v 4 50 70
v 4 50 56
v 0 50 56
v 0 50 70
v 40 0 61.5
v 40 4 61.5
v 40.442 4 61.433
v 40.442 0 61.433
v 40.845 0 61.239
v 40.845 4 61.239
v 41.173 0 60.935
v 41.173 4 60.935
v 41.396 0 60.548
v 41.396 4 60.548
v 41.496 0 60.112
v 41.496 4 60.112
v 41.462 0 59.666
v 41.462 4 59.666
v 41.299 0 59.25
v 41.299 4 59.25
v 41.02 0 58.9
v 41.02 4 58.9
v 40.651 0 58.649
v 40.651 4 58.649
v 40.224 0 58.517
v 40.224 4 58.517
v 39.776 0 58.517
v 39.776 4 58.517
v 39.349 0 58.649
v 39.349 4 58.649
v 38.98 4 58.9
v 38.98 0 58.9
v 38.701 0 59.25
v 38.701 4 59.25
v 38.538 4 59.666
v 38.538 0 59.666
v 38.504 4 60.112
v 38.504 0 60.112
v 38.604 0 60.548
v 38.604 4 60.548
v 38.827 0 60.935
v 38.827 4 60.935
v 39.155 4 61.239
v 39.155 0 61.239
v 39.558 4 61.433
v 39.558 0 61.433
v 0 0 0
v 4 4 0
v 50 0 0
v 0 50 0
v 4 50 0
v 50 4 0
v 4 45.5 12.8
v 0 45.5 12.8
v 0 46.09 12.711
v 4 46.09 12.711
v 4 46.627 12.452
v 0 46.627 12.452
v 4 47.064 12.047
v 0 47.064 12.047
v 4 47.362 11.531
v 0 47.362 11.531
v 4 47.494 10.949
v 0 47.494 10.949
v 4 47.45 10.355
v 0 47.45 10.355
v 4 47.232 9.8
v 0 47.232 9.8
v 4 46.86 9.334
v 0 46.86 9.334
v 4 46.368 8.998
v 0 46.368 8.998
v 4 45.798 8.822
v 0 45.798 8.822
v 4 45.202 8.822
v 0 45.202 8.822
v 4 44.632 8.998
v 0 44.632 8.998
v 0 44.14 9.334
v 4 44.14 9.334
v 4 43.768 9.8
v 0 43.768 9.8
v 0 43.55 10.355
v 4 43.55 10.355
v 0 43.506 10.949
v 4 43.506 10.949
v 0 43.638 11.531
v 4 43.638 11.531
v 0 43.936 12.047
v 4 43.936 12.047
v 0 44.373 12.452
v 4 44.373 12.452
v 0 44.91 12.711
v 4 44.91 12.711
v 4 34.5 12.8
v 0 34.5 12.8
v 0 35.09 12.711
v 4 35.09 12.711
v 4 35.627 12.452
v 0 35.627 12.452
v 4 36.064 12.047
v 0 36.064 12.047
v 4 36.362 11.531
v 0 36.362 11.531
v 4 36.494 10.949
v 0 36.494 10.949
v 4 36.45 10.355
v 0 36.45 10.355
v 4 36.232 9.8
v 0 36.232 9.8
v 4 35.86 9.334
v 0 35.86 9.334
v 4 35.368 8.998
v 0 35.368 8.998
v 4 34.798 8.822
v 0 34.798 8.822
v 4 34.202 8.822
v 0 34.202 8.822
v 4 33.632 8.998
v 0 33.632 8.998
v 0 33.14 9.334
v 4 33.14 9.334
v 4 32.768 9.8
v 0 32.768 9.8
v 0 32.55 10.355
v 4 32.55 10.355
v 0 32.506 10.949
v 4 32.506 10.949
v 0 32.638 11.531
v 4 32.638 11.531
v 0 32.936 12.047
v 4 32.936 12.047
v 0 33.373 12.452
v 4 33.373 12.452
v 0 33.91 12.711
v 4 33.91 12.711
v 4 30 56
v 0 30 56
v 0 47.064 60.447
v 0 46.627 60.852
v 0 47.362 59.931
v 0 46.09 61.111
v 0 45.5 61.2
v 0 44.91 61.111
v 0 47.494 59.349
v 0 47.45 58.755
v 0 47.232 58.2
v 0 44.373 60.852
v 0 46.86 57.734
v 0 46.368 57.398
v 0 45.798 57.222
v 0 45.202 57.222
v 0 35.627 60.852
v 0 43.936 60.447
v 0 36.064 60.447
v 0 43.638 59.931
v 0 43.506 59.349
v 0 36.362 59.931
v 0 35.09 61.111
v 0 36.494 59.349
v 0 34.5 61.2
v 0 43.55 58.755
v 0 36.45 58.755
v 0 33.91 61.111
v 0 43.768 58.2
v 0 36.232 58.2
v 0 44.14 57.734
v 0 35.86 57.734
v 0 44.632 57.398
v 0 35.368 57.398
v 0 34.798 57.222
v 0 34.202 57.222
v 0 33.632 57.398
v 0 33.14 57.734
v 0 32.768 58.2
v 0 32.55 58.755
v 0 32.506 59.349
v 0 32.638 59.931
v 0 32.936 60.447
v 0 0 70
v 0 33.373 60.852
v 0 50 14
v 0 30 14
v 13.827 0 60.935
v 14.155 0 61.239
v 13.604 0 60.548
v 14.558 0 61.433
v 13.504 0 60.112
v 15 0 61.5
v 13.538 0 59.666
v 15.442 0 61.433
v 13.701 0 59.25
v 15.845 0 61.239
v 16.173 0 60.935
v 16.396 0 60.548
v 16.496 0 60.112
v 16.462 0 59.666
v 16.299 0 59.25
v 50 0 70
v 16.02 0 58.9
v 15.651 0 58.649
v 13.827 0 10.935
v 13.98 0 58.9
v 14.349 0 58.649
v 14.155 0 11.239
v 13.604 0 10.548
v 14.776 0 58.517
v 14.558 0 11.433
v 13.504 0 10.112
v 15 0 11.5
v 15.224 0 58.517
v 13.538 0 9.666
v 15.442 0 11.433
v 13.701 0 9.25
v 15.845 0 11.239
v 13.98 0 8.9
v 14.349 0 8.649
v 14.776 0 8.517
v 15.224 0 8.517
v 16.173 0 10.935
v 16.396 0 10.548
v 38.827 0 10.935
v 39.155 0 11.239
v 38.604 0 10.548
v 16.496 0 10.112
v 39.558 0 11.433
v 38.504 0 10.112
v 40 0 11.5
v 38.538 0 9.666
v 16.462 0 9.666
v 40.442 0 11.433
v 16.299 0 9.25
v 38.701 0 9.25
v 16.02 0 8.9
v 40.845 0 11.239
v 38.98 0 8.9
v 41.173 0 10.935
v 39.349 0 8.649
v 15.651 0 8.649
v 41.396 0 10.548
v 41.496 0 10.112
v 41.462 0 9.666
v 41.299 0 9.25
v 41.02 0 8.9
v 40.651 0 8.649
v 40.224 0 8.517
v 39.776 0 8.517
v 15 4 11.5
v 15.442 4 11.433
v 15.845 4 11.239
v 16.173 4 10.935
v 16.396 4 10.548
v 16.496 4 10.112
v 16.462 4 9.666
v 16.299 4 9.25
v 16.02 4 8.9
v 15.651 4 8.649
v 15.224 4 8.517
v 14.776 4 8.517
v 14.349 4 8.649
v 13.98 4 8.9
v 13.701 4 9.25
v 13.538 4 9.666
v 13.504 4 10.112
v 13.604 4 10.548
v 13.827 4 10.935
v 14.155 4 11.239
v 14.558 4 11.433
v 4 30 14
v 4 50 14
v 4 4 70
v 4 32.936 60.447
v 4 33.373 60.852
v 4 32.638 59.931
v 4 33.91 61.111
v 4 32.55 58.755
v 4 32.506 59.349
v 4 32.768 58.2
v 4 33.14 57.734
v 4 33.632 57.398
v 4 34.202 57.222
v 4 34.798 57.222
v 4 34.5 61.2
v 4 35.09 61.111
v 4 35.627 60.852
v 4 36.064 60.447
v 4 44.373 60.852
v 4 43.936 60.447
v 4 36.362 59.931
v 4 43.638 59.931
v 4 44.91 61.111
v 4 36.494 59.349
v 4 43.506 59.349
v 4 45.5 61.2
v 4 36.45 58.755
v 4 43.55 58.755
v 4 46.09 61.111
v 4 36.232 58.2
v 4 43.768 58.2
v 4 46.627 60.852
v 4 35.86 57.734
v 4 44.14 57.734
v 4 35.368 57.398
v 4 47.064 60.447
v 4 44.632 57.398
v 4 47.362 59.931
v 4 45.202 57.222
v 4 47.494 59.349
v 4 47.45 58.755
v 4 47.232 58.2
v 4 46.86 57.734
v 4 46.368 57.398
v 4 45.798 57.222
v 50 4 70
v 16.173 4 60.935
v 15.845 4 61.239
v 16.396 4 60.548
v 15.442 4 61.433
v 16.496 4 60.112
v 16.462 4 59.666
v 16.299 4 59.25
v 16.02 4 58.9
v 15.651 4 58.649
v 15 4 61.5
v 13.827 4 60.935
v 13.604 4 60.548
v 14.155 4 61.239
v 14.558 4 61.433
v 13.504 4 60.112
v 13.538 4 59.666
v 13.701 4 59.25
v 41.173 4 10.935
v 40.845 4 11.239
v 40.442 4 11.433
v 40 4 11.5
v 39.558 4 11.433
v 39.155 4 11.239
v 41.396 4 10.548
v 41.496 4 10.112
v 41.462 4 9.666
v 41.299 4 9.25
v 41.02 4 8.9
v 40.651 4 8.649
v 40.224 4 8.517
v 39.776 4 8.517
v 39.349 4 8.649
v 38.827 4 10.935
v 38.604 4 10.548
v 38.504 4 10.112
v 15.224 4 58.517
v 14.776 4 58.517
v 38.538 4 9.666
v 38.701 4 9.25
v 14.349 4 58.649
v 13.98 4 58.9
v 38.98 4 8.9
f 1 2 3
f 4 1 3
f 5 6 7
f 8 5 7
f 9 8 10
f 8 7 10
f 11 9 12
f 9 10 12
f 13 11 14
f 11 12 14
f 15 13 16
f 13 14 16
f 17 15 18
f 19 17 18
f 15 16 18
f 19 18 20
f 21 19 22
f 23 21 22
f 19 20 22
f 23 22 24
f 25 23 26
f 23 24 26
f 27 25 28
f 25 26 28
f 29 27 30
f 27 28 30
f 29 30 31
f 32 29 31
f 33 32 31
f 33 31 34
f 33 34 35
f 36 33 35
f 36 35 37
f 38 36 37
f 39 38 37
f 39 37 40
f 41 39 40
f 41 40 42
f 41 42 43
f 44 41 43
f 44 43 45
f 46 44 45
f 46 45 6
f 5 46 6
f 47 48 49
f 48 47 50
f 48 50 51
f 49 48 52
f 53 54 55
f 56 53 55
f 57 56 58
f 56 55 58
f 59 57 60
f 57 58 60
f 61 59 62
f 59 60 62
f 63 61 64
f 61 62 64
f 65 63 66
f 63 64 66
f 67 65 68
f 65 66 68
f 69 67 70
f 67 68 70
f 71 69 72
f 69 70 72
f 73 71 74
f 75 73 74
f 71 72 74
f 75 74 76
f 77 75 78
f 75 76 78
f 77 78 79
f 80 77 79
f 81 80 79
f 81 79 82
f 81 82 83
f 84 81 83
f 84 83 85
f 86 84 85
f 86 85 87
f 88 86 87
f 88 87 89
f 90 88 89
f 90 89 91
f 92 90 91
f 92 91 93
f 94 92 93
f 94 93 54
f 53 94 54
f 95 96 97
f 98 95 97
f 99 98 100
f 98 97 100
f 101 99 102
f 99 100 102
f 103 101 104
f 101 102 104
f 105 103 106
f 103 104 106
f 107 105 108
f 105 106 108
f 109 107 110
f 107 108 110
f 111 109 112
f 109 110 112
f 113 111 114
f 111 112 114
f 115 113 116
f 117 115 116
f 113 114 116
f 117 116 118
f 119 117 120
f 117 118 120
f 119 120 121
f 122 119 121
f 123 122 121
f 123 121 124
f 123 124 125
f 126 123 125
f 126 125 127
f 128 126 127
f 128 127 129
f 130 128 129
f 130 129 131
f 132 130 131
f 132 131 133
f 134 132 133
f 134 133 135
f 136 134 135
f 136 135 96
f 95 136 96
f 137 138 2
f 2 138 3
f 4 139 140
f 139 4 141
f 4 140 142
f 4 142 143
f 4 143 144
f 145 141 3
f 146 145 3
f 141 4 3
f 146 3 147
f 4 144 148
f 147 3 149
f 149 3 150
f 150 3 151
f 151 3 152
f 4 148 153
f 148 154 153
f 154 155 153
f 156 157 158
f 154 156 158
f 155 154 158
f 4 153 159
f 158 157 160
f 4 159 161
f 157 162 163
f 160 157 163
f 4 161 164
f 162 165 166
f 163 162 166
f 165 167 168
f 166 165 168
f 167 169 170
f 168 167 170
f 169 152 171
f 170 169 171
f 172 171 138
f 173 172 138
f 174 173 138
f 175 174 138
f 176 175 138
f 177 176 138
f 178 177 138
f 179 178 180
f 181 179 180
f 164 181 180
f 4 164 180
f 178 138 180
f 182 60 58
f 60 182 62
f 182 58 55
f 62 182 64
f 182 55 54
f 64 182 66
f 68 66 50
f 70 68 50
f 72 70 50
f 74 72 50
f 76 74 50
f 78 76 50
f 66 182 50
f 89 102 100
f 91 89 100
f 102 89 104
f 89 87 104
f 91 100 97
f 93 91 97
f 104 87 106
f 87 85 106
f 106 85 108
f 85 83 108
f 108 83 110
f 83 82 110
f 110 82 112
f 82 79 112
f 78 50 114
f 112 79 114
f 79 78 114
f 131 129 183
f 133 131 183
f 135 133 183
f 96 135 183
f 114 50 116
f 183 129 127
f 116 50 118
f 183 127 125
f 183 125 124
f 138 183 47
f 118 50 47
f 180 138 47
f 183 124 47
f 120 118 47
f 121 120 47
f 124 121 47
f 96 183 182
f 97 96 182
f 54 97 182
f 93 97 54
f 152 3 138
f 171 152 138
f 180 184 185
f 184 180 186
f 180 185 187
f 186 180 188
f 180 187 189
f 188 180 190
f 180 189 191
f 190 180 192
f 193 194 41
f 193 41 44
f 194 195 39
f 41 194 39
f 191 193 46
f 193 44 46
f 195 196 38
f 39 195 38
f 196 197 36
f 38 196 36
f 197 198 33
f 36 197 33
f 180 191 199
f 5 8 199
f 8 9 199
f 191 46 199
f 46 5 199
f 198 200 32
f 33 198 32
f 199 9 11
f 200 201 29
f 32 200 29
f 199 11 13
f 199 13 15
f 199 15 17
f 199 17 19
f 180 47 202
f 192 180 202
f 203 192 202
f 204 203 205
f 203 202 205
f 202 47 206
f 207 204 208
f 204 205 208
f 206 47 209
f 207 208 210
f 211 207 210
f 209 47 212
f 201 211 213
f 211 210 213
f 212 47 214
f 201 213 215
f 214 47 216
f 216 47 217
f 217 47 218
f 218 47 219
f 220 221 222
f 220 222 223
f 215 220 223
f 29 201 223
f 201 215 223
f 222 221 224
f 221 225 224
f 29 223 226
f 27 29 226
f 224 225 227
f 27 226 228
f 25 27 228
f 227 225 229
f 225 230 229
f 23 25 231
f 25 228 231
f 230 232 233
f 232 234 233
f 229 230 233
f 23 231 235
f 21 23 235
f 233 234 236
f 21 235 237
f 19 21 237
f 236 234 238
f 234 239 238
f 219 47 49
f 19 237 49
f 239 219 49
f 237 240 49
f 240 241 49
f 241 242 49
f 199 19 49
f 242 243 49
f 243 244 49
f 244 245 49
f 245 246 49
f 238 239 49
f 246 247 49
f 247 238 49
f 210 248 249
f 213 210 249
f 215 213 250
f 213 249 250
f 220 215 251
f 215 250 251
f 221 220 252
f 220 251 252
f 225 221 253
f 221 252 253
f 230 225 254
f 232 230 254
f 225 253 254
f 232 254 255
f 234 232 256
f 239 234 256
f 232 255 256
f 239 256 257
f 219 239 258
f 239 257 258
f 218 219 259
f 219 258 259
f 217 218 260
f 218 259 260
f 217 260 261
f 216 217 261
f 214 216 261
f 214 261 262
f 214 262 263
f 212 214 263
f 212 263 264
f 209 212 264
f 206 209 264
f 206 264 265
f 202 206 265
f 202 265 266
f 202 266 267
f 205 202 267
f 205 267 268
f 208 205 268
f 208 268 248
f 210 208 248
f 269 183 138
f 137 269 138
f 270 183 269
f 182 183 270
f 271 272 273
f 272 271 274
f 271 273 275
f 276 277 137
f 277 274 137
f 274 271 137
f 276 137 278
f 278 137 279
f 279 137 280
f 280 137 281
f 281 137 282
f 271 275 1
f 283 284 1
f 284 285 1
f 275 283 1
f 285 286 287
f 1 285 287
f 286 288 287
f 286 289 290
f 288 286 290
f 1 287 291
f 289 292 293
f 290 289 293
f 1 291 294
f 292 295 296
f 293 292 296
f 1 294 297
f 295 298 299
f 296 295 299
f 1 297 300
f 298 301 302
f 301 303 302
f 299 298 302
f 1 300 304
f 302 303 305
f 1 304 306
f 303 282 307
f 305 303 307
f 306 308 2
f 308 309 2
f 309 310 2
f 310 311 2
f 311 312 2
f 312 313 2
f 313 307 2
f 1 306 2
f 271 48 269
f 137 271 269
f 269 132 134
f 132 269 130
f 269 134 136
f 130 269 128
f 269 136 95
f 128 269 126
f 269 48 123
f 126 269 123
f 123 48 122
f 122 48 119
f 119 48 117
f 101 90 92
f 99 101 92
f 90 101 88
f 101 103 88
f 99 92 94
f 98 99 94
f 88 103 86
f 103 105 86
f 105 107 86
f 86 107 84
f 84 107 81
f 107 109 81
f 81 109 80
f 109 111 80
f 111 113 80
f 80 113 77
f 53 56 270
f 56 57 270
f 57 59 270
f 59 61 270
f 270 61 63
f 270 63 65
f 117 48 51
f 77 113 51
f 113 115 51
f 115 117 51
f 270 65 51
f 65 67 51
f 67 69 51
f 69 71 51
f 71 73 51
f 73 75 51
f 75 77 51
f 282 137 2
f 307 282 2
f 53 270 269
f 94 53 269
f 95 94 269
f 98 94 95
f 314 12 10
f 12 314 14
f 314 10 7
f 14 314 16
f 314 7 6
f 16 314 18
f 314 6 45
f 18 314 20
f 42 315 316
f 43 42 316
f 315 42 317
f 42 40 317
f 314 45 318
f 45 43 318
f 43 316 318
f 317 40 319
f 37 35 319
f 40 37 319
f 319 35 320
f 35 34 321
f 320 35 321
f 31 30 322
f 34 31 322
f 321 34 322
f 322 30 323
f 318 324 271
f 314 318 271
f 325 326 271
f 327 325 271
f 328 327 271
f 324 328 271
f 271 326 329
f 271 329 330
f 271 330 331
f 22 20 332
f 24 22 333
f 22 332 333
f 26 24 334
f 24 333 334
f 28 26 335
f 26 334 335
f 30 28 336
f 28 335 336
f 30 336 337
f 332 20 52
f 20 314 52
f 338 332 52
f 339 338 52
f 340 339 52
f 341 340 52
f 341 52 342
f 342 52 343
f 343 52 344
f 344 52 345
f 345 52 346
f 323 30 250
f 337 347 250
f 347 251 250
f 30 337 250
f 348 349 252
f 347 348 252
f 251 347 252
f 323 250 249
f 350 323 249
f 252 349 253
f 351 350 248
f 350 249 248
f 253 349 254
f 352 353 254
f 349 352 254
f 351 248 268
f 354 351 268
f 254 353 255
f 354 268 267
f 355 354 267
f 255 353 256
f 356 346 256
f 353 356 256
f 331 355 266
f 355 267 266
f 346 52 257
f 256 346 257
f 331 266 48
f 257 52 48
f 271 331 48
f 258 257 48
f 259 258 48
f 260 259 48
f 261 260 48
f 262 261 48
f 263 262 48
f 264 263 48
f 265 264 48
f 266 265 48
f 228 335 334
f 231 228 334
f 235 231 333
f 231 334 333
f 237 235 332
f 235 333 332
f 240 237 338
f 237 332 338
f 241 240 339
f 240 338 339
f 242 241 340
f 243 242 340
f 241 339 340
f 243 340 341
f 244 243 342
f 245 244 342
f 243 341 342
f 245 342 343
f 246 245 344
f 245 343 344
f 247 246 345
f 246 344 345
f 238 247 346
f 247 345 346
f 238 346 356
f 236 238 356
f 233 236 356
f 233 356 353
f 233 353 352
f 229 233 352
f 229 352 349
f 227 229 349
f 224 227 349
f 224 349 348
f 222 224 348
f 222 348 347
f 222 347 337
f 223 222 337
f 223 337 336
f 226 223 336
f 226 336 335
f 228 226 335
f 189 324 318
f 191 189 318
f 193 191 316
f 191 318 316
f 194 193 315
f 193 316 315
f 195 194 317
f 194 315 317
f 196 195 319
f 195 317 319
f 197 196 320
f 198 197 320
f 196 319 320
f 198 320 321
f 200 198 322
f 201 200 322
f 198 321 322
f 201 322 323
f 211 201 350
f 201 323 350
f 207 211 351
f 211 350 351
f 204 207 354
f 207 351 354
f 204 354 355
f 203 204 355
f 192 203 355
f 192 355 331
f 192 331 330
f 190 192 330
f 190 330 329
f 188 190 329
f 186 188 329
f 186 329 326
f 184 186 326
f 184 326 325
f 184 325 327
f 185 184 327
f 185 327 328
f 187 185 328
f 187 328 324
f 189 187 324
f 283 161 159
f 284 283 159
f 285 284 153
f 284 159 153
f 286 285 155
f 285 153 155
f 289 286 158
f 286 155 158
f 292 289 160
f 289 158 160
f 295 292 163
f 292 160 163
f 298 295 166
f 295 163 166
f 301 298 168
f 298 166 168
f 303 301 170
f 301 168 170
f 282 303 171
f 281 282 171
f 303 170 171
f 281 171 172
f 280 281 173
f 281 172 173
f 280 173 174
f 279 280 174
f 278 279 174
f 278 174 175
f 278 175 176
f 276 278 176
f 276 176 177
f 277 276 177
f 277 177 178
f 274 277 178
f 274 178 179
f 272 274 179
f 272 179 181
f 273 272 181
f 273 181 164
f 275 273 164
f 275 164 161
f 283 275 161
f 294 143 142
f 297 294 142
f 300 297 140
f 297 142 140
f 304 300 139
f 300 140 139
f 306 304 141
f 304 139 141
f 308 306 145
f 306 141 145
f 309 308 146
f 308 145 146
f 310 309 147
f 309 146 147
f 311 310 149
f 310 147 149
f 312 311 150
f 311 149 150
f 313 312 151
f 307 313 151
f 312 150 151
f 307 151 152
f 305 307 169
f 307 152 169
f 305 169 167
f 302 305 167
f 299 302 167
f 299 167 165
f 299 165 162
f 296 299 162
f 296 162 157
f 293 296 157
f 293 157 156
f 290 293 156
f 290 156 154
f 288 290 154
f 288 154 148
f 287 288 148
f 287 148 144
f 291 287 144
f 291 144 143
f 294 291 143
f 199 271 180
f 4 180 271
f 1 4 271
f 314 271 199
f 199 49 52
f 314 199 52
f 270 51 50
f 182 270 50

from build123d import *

# Parameters (mm, degrees)
EXTRUSION1_DEPTH                = 70
ESQUISSE2_W                     = 42
ESQUISSE2_H                     = 20
EXTRUSION2_DEPTH                = 70
ESQUISSE4_R                     = 1.5
EXTRUSION3_DEPTH                = 98.549987186
R_P_TITION_LIN_AIRE1_COUNT      = 2
R_P_TITION_LIN_AIRE1_PITCH      = 50
R_P_TITION_LIN_AIRE1_COUNT_DIR2 = 2
R_P_TITION_LIN_AIRE1_PITCH_DIR2 = 25
ESQUISSE5_R                     = 2
ENL_V_MAT_EXTRU_1_DEPTH         = 10
ESQUISSE6_R                     = 2
ENL_V_MAT_EXTRU_2_DEPTH         = 10
ESQUISSE7_R                     = 2
ENL_V_MAT_EXTRU_3_DEPTH         = 10
ESQUISSE8_R                     = 2
ENL_V_MAT_EXTRU_4_DEPTH         = 10


with BuildPart() as part:
    # Esquisse1 → Extrusion1 (new body)
    with BuildSketch(Plane.XY):
        Polygon((0, 0), (4, 0), (50, 0), (50, 4), (4, 4), (4, 50), (0, 50), align=None)
    extrude(amount=EXTRUSION1_DEPTH)

    # Esquisse2 → Extrusion2 (cut)
    with BuildSketch(Plane.ZY):
        with Locations((35, 40)):
            Rectangle(ESQUISSE2_W, ESQUISSE2_H)
    extrude(amount=-EXTRUSION2_DEPTH, mode=Mode.SUBTRACT)

    # Esquisse4 → Extrusion3 (cut, through all)
    with BuildSketch(Plane(origin=(0, 4, 0), x_dir=(1, 0, 0), z_dir=(0, 1, 0))):
        with Locations(Location((40, -60, 0), (0, 0, 270))):
            Circle(ESQUISSE4_R)
    extrusion3 = extrude(amount=-EXTRUSION3_DEPTH, mode=Mode.SUBTRACT)

    # Répétition linéaire1: Extrusion3 2 × 2
    with Locations(*[(-j * R_P_TITION_LIN_AIRE1_PITCH_DIR2, 0, -i * R_P_TITION_LIN_AIRE1_PITCH) for i in range(R_P_TITION_LIN_AIRE1_COUNT) for j in range(R_P_TITION_LIN_AIRE1_COUNT_DIR2) if (i, j) != (0, 0)]):
        add(extrusion3, mode=Mode.SUBTRACT)

    # Esquisse5 → Enlèv. mat.-Extru.1 (cut)
    with BuildSketch(Plane.ZY):
        with Locations((59.2, 45.5)):
            Circle(ESQUISSE5_R)
    extrude(amount=-ENL_V_MAT_EXTRU_1_DEPTH, mode=Mode.SUBTRACT)

    # Esquisse6 → Enlèv. mat.-Extru.2 (cut)
    with BuildSketch(Plane.ZY):
        with Locations((59.2, 34.5)):
            Circle(ESQUISSE6_R)
    extrude(amount=-ENL_V_MAT_EXTRU_2_DEPTH, mode=Mode.SUBTRACT)

    # Esquisse7 → Enlèv. mat.-Extru.3 (cut)
    with BuildSketch(Plane.ZY):
        with Locations((10.8, 34.5)):
            Circle(ESQUISSE7_R)
    extrude(amount=-ENL_V_MAT_EXTRU_3_DEPTH, mode=Mode.SUBTRACT)

    # Esquisse8 → Enlèv. mat.-Extru.4 (cut)
    with BuildSketch(Plane.ZY):
        with Locations((10.8, 45.5)):
            Circle(ESQUISSE8_R)
    extrude(amount=-ENL_V_MAT_EXTRU_4_DEPTH, mode=Mode.SUBTRACT)


solid = part.part
